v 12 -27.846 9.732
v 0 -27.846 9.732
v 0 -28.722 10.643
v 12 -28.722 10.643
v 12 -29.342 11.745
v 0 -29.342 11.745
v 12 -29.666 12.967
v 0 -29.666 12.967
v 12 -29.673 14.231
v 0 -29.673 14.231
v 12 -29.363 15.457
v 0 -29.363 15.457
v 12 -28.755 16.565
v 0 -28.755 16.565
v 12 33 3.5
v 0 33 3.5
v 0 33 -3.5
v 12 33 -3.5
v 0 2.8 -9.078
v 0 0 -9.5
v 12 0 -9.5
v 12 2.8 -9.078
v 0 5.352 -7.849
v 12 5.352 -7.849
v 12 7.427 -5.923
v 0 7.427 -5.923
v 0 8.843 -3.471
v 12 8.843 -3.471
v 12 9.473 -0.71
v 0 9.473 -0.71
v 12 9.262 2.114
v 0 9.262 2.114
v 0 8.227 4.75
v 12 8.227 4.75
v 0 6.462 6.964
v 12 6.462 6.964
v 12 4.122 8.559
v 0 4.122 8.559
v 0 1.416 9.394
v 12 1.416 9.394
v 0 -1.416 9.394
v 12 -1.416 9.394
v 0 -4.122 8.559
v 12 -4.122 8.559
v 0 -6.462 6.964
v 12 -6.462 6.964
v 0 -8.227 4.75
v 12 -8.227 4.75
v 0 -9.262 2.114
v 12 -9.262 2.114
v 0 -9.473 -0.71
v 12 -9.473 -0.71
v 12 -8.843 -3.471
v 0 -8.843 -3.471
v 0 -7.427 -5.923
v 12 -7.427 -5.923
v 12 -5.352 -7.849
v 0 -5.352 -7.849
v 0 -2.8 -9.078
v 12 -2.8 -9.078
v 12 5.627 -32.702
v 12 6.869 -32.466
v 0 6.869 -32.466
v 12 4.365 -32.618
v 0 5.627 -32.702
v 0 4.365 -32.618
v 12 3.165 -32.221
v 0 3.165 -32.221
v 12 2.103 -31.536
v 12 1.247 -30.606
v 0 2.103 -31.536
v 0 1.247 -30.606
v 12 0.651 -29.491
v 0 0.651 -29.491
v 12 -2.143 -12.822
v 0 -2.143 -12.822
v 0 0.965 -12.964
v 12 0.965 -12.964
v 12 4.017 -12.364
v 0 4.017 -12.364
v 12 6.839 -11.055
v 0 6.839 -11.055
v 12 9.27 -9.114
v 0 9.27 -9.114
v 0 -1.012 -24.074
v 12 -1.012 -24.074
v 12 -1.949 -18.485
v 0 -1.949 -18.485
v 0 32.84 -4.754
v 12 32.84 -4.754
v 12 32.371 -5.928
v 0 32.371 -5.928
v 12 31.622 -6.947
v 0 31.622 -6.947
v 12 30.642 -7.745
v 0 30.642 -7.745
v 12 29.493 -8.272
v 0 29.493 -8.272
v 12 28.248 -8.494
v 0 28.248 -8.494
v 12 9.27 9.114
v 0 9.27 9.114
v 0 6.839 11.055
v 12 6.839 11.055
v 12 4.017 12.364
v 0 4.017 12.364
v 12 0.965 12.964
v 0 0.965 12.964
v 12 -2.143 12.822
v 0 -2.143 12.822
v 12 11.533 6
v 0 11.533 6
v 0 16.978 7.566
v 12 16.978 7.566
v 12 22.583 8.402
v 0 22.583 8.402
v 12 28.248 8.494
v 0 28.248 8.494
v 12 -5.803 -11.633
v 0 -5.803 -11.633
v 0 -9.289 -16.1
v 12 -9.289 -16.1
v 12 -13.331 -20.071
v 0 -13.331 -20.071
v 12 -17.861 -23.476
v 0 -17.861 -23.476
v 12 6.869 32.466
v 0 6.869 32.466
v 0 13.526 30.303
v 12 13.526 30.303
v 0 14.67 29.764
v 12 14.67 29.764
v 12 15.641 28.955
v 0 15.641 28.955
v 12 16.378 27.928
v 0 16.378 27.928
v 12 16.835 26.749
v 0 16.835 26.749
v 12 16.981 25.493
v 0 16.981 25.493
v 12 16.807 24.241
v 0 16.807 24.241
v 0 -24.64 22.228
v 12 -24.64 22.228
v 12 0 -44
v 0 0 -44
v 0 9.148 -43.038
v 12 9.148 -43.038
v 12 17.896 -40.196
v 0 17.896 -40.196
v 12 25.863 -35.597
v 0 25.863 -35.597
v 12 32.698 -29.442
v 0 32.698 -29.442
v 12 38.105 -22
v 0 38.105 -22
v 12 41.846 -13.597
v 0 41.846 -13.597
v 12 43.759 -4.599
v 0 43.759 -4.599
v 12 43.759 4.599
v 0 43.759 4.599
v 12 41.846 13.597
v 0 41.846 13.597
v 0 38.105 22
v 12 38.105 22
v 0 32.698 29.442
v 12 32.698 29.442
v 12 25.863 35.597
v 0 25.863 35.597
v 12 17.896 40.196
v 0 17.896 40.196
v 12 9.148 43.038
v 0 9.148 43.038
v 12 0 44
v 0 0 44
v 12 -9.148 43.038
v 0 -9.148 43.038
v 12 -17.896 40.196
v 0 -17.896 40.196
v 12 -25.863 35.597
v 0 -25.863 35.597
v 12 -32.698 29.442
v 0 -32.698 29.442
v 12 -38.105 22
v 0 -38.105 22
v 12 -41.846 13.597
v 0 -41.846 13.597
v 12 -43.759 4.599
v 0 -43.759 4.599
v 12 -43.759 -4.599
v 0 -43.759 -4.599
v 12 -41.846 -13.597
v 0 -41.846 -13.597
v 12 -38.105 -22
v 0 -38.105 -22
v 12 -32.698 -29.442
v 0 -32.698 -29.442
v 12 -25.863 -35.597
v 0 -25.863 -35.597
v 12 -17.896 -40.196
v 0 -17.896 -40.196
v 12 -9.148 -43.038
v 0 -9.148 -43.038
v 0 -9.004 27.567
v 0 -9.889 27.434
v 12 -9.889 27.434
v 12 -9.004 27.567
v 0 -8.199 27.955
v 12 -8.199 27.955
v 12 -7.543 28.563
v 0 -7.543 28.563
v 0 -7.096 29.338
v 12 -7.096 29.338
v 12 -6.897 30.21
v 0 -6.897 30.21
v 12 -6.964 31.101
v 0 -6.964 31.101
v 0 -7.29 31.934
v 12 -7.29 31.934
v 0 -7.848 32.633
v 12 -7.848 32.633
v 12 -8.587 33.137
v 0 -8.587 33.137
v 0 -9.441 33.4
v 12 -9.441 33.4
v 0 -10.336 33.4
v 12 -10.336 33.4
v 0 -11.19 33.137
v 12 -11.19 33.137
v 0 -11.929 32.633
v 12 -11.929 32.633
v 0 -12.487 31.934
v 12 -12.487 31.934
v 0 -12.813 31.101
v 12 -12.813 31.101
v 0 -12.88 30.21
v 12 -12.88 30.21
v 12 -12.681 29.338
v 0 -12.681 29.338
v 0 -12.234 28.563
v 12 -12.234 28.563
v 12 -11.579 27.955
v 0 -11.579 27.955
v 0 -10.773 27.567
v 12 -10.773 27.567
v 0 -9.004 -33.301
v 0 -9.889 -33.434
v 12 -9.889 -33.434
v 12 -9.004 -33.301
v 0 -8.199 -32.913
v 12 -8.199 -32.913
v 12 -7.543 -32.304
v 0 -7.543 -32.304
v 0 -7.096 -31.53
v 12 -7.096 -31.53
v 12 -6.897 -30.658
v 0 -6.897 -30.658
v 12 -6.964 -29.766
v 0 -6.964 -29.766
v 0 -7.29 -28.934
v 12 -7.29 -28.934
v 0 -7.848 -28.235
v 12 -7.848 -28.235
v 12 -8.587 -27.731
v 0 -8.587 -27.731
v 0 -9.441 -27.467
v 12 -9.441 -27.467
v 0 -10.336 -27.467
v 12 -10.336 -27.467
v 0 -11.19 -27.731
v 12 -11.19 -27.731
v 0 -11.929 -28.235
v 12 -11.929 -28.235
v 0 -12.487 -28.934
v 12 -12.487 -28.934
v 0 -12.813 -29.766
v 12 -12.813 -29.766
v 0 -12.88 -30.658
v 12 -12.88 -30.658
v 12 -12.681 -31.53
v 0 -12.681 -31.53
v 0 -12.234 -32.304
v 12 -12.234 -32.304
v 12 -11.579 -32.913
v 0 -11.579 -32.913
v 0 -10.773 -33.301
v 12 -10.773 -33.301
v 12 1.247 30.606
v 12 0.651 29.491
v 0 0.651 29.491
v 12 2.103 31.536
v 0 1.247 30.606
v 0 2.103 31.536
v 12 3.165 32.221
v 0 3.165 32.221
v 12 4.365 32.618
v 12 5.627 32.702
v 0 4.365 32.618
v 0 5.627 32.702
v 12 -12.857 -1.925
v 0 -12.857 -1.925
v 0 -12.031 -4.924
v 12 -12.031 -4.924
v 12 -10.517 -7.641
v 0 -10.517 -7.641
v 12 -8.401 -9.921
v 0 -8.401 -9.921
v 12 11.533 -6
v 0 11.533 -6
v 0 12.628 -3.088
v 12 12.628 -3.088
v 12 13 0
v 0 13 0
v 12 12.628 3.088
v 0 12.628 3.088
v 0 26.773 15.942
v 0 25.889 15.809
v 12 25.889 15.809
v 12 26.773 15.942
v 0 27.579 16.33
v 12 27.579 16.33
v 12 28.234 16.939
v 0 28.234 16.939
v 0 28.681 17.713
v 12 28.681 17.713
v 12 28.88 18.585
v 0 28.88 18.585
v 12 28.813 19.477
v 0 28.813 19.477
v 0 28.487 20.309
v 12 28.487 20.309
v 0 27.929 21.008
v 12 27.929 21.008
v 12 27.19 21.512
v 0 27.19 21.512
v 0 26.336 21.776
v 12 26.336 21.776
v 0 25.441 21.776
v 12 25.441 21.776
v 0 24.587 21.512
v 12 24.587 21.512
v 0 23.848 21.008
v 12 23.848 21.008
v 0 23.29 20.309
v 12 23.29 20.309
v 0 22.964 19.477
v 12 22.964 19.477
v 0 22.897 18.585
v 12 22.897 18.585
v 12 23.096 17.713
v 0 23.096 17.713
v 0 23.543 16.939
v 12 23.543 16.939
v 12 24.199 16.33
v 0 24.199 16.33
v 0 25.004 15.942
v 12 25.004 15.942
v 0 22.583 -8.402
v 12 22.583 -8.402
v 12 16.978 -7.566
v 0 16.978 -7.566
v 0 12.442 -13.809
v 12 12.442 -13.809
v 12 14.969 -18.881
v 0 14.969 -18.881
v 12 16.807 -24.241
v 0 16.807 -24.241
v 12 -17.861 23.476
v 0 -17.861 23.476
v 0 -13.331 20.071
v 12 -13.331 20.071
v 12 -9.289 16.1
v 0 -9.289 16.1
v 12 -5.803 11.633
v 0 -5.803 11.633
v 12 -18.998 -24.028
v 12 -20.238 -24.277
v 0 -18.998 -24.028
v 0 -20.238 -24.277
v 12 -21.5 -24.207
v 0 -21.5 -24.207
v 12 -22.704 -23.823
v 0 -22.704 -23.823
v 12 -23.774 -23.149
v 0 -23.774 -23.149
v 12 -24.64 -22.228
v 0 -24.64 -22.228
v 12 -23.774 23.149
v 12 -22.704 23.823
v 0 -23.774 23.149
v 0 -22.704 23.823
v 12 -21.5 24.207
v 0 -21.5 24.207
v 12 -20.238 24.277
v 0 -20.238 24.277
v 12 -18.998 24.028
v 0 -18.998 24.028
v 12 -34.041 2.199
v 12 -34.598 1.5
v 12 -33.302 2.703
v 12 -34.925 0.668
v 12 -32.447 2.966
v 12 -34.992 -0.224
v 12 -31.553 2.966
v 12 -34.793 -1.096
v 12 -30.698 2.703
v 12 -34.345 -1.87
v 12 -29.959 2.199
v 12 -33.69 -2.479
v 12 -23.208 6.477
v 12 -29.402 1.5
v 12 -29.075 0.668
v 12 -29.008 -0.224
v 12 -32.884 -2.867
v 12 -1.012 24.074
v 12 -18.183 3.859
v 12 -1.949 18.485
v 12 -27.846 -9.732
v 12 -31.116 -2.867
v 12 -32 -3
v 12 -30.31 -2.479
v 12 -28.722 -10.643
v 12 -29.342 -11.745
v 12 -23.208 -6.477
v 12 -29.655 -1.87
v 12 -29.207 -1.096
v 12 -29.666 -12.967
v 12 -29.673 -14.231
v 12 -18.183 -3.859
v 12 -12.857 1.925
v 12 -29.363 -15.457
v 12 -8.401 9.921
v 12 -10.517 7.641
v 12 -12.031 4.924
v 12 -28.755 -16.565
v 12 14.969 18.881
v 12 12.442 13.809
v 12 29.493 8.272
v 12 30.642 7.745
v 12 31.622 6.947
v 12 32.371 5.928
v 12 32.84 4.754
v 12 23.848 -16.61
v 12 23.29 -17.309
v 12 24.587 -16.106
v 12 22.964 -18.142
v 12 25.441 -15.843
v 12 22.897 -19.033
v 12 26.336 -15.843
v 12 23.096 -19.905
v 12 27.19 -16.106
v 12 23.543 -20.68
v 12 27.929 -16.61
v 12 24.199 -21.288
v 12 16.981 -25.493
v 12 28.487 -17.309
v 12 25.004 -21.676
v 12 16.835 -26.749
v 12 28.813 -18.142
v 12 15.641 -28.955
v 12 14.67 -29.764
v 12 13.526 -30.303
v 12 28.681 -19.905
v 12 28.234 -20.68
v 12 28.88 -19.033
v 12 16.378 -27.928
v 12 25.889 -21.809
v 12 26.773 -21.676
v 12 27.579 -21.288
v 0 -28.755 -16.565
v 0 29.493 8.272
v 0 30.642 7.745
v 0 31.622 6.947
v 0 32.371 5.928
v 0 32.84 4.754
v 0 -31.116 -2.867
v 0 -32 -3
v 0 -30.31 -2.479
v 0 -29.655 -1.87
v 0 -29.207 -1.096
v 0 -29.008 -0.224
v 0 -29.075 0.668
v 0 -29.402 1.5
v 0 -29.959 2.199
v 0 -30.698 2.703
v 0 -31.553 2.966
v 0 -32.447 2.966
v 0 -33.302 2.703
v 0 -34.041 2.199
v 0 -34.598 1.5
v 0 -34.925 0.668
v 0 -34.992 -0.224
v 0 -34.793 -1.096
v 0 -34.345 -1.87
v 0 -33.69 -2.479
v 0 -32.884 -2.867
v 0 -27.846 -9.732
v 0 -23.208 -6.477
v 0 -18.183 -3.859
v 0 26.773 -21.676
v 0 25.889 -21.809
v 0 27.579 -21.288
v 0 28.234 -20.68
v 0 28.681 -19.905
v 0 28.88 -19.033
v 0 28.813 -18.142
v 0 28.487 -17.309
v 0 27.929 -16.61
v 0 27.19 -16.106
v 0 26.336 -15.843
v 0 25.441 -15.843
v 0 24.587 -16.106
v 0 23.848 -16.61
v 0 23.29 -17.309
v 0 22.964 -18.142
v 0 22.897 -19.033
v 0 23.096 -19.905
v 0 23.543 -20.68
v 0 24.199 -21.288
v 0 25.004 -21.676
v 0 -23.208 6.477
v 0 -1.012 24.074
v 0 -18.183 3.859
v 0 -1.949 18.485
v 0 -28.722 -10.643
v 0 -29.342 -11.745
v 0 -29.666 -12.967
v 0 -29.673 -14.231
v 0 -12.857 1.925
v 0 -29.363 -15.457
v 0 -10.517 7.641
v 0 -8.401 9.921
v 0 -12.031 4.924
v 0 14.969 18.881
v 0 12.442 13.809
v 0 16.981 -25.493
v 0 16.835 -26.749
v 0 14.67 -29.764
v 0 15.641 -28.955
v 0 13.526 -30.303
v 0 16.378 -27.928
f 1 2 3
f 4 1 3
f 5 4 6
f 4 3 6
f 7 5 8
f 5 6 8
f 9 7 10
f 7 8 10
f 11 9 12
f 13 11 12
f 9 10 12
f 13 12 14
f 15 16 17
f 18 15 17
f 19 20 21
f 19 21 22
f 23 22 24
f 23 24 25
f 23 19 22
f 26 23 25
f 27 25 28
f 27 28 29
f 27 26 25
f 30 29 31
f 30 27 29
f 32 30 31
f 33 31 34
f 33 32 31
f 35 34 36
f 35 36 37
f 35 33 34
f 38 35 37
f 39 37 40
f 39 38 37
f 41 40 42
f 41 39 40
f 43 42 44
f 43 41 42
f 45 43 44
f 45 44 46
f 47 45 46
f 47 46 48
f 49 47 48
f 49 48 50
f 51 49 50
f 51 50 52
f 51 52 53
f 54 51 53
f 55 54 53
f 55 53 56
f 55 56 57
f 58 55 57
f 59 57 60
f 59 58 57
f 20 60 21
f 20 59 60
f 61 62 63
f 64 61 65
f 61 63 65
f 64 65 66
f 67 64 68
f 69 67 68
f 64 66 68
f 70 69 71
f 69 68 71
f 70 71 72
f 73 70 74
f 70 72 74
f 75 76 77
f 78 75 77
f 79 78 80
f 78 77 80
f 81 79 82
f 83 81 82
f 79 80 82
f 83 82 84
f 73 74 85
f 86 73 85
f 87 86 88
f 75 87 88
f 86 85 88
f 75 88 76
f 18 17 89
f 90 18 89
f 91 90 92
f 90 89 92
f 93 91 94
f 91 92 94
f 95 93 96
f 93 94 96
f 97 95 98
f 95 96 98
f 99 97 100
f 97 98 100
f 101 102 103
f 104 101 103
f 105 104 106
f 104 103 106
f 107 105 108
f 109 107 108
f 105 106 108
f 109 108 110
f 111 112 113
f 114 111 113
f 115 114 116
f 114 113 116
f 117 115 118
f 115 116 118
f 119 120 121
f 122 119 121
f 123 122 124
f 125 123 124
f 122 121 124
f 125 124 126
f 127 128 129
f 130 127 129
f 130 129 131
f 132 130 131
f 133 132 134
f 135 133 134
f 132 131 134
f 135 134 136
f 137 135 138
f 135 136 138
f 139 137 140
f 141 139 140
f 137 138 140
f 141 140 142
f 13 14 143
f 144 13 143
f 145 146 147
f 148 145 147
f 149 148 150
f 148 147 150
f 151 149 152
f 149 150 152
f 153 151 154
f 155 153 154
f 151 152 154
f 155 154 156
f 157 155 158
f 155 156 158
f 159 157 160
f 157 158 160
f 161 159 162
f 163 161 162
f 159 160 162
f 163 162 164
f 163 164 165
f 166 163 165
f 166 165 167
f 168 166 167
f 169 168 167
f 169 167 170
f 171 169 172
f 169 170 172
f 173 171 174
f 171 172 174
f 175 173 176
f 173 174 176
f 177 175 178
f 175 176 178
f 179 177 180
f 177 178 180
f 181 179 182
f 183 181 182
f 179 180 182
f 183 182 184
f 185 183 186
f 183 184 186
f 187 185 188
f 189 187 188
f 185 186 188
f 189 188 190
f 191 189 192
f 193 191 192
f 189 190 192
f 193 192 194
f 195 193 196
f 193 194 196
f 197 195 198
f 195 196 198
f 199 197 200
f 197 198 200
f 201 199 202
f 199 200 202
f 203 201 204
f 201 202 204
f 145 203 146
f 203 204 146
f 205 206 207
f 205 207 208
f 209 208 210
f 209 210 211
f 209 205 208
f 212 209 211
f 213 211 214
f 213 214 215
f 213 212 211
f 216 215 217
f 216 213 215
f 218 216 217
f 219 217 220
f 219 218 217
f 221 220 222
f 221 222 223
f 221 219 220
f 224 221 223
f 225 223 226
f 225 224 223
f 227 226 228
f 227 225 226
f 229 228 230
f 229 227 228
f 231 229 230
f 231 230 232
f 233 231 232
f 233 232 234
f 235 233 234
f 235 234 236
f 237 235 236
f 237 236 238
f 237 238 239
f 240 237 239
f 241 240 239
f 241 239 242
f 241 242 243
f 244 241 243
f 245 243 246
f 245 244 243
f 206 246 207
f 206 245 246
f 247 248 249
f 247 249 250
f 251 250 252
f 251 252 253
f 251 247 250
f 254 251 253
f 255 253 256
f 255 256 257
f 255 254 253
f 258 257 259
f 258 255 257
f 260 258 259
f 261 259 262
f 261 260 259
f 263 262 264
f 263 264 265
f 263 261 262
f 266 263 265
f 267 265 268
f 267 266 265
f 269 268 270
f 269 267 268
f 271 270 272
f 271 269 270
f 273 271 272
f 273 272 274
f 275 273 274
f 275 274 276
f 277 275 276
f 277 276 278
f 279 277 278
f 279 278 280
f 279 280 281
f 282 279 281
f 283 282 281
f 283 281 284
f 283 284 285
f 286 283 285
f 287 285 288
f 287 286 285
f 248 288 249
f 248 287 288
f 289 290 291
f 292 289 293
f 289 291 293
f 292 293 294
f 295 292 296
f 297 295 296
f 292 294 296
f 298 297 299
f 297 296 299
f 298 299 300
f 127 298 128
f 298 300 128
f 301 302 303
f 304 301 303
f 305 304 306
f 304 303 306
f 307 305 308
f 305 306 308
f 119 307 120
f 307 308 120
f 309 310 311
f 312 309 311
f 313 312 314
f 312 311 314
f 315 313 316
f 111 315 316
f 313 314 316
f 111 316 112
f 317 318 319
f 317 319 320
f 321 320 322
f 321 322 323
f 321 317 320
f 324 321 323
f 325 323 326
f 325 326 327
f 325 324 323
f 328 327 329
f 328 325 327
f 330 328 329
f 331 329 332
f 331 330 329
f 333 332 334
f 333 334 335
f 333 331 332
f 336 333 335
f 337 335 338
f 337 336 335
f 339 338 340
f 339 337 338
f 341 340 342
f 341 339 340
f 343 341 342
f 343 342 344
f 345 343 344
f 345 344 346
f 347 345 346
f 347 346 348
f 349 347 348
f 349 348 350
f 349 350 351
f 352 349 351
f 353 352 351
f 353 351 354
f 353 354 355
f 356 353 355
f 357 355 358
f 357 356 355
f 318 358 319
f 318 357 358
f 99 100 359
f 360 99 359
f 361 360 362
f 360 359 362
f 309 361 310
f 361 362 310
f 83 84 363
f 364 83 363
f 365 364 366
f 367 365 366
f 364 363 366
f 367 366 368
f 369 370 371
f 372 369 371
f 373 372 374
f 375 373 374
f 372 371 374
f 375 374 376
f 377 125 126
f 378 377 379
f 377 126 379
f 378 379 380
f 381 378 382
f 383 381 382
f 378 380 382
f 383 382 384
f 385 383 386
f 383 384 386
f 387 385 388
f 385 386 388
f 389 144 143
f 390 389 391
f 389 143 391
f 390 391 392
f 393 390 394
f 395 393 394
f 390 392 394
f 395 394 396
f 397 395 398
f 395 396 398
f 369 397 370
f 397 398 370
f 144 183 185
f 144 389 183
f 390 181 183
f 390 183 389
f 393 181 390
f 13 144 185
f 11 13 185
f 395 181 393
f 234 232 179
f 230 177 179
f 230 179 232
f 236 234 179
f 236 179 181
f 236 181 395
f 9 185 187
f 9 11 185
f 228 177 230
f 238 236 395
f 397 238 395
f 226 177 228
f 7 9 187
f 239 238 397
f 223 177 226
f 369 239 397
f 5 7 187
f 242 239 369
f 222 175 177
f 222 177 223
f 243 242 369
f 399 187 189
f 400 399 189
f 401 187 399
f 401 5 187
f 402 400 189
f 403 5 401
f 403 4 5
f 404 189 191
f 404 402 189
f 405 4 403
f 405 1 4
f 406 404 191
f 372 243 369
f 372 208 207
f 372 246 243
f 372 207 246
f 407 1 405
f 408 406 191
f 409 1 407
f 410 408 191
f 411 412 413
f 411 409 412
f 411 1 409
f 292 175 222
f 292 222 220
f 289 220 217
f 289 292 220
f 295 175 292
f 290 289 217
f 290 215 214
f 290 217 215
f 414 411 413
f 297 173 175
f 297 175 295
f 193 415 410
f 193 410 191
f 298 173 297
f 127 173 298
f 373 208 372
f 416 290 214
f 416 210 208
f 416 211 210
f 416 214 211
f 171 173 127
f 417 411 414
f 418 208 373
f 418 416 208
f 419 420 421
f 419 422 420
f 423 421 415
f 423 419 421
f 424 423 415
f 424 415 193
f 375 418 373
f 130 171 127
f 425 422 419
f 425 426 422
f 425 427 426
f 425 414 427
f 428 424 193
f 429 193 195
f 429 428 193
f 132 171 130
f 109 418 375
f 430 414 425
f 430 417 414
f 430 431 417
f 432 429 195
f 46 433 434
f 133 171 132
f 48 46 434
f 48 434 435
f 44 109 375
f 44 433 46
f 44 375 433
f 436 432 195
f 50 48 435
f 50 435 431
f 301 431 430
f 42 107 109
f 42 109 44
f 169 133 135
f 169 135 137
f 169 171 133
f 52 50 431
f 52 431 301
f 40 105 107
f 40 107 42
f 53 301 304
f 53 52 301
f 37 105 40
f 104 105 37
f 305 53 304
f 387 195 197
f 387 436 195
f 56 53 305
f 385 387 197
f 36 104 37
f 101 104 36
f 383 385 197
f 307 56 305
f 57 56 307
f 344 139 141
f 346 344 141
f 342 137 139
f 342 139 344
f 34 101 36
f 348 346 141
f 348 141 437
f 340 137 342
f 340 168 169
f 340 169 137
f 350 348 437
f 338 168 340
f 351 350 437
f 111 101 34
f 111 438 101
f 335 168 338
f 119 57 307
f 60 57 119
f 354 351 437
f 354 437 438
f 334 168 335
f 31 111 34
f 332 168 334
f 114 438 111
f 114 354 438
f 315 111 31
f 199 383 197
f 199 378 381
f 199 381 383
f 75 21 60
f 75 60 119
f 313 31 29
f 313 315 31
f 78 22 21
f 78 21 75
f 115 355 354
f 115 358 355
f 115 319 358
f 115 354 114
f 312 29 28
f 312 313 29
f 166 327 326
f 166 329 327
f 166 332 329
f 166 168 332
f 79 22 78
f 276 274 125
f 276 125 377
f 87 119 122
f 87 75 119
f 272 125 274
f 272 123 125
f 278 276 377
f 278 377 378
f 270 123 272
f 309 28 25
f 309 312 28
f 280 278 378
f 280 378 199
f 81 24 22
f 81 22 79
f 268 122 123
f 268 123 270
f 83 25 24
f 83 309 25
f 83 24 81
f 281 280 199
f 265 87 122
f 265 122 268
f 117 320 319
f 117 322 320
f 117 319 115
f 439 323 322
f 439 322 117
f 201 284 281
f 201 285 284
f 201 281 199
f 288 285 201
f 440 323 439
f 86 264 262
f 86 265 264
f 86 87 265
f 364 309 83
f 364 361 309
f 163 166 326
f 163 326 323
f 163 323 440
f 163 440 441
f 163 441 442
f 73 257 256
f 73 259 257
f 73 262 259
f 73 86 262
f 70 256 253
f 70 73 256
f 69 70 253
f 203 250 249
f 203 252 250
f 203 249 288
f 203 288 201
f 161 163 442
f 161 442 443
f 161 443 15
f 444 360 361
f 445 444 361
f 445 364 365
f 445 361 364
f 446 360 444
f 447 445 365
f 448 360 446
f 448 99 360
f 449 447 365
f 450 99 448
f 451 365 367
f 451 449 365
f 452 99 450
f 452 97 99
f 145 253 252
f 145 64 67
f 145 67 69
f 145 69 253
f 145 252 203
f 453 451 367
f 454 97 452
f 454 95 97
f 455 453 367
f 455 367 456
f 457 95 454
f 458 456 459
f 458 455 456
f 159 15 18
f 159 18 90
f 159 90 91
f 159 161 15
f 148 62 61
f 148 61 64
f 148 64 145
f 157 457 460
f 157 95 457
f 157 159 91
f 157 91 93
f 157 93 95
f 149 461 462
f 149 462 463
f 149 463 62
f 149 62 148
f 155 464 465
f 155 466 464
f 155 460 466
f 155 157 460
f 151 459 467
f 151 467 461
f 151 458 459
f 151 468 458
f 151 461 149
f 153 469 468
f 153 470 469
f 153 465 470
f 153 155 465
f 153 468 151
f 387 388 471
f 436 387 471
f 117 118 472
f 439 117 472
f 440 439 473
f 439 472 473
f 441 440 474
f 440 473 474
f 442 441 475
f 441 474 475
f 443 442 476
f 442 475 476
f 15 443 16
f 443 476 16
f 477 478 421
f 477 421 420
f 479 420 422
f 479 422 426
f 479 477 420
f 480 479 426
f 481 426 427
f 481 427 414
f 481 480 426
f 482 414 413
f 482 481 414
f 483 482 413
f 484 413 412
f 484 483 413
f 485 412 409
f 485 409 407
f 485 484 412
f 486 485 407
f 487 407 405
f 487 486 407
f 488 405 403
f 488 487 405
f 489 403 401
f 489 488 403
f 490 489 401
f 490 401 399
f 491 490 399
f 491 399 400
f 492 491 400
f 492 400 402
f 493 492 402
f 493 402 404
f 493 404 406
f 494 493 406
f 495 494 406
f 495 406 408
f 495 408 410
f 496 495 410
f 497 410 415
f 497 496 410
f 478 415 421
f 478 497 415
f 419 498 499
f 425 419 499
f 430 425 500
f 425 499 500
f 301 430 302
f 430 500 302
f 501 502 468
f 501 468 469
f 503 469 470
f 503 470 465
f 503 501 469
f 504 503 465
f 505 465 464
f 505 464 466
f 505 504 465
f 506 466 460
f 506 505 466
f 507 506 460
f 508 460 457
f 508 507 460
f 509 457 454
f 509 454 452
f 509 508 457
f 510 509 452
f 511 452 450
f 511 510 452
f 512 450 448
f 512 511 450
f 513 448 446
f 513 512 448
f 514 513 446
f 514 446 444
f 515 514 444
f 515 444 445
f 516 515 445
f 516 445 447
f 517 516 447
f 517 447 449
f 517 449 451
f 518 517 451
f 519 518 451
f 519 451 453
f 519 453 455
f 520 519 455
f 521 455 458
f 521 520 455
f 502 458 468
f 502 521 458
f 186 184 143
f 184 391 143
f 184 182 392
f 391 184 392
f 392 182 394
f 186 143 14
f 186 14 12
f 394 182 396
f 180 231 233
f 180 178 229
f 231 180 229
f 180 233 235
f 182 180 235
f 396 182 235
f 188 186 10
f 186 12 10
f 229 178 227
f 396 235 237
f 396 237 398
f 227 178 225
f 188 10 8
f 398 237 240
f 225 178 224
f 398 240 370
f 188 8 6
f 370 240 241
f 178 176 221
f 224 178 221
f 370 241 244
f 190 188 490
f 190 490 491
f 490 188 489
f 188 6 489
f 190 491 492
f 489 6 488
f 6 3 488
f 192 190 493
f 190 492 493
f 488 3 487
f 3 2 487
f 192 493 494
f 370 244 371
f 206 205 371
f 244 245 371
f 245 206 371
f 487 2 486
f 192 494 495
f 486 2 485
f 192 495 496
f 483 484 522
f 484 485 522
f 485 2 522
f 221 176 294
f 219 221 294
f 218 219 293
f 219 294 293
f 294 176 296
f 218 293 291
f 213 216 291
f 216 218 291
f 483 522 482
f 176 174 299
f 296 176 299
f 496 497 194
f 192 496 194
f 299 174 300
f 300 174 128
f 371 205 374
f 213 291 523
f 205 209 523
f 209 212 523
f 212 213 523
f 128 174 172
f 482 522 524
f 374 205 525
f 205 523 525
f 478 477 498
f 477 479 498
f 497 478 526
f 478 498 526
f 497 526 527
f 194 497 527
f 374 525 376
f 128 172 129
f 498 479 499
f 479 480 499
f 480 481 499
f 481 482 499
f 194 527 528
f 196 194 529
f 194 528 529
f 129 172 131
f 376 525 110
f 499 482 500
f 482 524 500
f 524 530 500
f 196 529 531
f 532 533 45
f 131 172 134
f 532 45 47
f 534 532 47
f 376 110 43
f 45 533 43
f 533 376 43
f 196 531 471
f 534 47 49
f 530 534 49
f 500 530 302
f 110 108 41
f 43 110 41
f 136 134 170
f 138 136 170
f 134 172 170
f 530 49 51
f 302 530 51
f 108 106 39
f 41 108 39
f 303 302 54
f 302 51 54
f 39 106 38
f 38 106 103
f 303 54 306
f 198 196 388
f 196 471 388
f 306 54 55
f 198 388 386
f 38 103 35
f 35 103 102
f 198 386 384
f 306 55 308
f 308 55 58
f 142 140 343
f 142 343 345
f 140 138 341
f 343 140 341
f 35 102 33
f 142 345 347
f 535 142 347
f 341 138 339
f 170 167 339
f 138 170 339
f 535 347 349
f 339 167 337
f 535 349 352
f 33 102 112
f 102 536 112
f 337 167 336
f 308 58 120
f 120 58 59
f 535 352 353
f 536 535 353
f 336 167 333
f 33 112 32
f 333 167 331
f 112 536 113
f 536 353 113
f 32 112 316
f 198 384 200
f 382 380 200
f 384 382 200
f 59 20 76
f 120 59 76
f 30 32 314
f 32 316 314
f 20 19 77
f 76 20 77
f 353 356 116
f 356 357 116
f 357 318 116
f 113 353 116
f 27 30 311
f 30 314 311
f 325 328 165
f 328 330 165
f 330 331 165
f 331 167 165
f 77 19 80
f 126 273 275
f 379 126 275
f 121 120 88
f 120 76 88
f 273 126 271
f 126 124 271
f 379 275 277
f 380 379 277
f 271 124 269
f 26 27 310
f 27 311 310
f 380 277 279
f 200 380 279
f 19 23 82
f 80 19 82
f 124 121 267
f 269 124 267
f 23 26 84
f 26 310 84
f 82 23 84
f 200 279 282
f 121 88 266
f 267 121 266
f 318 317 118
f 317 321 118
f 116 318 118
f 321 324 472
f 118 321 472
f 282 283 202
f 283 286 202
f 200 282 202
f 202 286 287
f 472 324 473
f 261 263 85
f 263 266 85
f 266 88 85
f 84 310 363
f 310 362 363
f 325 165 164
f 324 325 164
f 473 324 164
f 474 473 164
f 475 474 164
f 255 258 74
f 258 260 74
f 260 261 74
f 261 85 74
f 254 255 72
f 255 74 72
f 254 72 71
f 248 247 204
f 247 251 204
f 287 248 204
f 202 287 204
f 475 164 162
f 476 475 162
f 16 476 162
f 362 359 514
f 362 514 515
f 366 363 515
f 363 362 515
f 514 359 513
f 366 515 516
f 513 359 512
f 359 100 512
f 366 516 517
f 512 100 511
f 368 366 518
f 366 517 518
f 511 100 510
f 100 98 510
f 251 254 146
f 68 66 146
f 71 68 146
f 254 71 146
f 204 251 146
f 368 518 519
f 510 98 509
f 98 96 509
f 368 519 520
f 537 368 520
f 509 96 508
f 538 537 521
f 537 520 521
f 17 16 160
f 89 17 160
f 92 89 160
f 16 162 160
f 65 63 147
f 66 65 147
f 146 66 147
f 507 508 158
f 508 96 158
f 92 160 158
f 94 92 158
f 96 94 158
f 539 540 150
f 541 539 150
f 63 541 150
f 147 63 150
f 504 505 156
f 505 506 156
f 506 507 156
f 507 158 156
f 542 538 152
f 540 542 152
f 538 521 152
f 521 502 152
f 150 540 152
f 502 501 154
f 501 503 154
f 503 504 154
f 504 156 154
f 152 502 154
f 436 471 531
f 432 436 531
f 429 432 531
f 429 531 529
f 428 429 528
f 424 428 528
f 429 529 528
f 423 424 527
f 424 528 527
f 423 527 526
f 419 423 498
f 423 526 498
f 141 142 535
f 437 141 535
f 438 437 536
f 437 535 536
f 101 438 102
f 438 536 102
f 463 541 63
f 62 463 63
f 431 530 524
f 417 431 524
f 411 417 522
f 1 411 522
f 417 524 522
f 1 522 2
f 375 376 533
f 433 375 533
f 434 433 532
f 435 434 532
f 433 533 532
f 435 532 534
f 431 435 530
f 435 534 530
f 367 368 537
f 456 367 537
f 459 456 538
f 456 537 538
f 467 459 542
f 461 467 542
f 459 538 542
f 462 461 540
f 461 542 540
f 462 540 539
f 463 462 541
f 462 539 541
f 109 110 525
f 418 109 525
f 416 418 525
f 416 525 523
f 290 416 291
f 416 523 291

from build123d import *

# Parameters (mm, degrees)
SKETCH_1_R      = 44
SKETCH_1_R_2    = 3
SKETCH_1_R_3    = 9.5
EXTRUDE_1_DEPTH = 12


with BuildPart() as part:
    # 草图1 → 凸台-拉伸1 (new body)
    with BuildSketch(Plane(origin=(0, 0, 0), x_dir=(0, 0, -1), z_dir=(1, 0, 0))):
        Circle(SKETCH_1_R)
        with Locations((0, -32)):
            Circle(SKETCH_1_R_2, mode=Mode.SUBTRACT)
        with Locations((-30.433808521, -9.88854382)):
            Circle(SKETCH_1_R_2, mode=Mode.SUBTRACT)
        with Locations((-18.809128073, 25.88854382)):
            Circle(SKETCH_1_R_2, mode=Mode.SUBTRACT)
        with Locations((18.809128073, 25.88854382)):
            Circle(SKETCH_1_R_2, mode=Mode.SUBTRACT)
        with Locations((30.433808521, -9.88854382)):
            Circle(SKETCH_1_R_2, mode=Mode.SUBTRACT)
        Circle(SKETCH_1_R_3, mode=Mode.SUBTRACT)
        with BuildLine():
            Line((-3.5, 33), (3.5, 33))
            ThreePointArc((3.5, 33), (6.946569358, 31.62231413), (8.493822755, 28.248463863))
            ThreePointArc((8.493822755, 28.248463863), (8.076258868, 19.766783996), (6, 11.532562595))
            ThreePointArc((6, 11.532562595), (0, 13), (-6, 11.532562595))
            ThreePointArc((-6, 11.532562595), (-8.076258868, 19.766783996), (-8.493822755, 28.248463863))
            ThreePointArc((-8.493822755, 28.248463863), (-6.946569358, 31.62231413), (-3.5, 33))
        make_face(mode=Mode.SUBTRACT)
        with BuildLine():
            Line((30.303305557, 13.526258621), (32.466424518, 6.868863007))
            ThreePointArc((32.466424518, 6.868863007), (32.221215898, 3.165252414), (29.490621211, 0.651149919))
            ThreePointArc((29.490621211, 0.651149919), (21.295029967, -1.572706445), (12.822220771, -2.142581267))
            ThreePointArc((12.822220771, -2.142581267), (12.363734712, 4.017220927), (9.114016839, 9.270096928))
            ThreePointArc((9.114016839, 9.270096928), (16.303627484, 13.789250803), (24.241150054, 16.807360878))
            ThreePointArc((24.241150054, 16.807360878), (27.92799993, 16.378412522), (30.303305557, 13.526258621))
        make_face(mode=Mode.SUBTRACT)
        with BuildLine():
            Line((22.228472806, -24.640312431), (16.565353845, -28.754809197))
            ThreePointArc((16.565353845, -28.754809197), (12.967237226, -29.666080556), (9.732383503, -27.846031081))
            ThreePointArc((9.732383503, -27.846031081), (5.084793443, -20.738770033), (1.924568248, -12.856750642))
            ThreePointArc((1.924568248, -12.856750642), (7.64120828, -10.517220927), (11.632772181, -5.803327614))
            ThreePointArc((11.632772181, -5.803327614), (18.152454794, -11.24455832), (23.475677415, -17.860943579))
            ThreePointArc((23.475677415, -17.860943579), (24.207022553, -21.49989851), (22.228472806, -24.640312431))
        make_face(mode=Mode.SUBTRACT)
        with BuildLine():
            Line((-16.565353845, -28.754809197), (-22.228472806, -24.640312431))
            ThreePointArc((-22.228472806, -24.640312431), (-24.207022553, -21.49989851), (-23.475677415, -17.860943579))
            ThreePointArc((-23.475677415, -17.860943579), (-18.152454794, -11.24455832), (-11.632772181, -5.803327614))
            ThreePointArc((-11.632772181, -5.803327614), (-7.64120828, -10.517220927), (-1.924568248, -12.856750642))
            ThreePointArc((-1.924568248, -12.856750642), (-5.084793443, -20.738770033), (-9.732383503, -27.846031081))
            ThreePointArc((-9.732383503, -27.846031081), (-12.967237226, -29.666080556), (-16.565353845, -28.754809197))
        make_face(mode=Mode.SUBTRACT)
        with BuildLine():
            Line((-32.466424518, 6.868863007), (-30.303305557, 13.526258621))
            ThreePointArc((-30.303305557, 13.526258621), (-27.92799993, 16.378412522), (-24.241150054, 16.807360878))
            ThreePointArc((-24.241150054, 16.807360878), (-16.303627484, 13.789250803), (-9.114016839, 9.270096928))
            ThreePointArc((-9.114016839, 9.270096928), (-12.363734712, 4.017220927), (-12.822220771, -2.142581267))
            ThreePointArc((-12.822220771, -2.142581267), (-21.295029967, -1.572706445), (-29.490621211, 0.651149919))
            ThreePointArc((-29.490621211, 0.651149919), (-32.221215898, 3.165252414), (-32.466424518, 6.868863007))
        make_face(mode=Mode.SUBTRACT)
    extrude(amount=EXTRUDE_1_DEPTH)


solid = part.part
